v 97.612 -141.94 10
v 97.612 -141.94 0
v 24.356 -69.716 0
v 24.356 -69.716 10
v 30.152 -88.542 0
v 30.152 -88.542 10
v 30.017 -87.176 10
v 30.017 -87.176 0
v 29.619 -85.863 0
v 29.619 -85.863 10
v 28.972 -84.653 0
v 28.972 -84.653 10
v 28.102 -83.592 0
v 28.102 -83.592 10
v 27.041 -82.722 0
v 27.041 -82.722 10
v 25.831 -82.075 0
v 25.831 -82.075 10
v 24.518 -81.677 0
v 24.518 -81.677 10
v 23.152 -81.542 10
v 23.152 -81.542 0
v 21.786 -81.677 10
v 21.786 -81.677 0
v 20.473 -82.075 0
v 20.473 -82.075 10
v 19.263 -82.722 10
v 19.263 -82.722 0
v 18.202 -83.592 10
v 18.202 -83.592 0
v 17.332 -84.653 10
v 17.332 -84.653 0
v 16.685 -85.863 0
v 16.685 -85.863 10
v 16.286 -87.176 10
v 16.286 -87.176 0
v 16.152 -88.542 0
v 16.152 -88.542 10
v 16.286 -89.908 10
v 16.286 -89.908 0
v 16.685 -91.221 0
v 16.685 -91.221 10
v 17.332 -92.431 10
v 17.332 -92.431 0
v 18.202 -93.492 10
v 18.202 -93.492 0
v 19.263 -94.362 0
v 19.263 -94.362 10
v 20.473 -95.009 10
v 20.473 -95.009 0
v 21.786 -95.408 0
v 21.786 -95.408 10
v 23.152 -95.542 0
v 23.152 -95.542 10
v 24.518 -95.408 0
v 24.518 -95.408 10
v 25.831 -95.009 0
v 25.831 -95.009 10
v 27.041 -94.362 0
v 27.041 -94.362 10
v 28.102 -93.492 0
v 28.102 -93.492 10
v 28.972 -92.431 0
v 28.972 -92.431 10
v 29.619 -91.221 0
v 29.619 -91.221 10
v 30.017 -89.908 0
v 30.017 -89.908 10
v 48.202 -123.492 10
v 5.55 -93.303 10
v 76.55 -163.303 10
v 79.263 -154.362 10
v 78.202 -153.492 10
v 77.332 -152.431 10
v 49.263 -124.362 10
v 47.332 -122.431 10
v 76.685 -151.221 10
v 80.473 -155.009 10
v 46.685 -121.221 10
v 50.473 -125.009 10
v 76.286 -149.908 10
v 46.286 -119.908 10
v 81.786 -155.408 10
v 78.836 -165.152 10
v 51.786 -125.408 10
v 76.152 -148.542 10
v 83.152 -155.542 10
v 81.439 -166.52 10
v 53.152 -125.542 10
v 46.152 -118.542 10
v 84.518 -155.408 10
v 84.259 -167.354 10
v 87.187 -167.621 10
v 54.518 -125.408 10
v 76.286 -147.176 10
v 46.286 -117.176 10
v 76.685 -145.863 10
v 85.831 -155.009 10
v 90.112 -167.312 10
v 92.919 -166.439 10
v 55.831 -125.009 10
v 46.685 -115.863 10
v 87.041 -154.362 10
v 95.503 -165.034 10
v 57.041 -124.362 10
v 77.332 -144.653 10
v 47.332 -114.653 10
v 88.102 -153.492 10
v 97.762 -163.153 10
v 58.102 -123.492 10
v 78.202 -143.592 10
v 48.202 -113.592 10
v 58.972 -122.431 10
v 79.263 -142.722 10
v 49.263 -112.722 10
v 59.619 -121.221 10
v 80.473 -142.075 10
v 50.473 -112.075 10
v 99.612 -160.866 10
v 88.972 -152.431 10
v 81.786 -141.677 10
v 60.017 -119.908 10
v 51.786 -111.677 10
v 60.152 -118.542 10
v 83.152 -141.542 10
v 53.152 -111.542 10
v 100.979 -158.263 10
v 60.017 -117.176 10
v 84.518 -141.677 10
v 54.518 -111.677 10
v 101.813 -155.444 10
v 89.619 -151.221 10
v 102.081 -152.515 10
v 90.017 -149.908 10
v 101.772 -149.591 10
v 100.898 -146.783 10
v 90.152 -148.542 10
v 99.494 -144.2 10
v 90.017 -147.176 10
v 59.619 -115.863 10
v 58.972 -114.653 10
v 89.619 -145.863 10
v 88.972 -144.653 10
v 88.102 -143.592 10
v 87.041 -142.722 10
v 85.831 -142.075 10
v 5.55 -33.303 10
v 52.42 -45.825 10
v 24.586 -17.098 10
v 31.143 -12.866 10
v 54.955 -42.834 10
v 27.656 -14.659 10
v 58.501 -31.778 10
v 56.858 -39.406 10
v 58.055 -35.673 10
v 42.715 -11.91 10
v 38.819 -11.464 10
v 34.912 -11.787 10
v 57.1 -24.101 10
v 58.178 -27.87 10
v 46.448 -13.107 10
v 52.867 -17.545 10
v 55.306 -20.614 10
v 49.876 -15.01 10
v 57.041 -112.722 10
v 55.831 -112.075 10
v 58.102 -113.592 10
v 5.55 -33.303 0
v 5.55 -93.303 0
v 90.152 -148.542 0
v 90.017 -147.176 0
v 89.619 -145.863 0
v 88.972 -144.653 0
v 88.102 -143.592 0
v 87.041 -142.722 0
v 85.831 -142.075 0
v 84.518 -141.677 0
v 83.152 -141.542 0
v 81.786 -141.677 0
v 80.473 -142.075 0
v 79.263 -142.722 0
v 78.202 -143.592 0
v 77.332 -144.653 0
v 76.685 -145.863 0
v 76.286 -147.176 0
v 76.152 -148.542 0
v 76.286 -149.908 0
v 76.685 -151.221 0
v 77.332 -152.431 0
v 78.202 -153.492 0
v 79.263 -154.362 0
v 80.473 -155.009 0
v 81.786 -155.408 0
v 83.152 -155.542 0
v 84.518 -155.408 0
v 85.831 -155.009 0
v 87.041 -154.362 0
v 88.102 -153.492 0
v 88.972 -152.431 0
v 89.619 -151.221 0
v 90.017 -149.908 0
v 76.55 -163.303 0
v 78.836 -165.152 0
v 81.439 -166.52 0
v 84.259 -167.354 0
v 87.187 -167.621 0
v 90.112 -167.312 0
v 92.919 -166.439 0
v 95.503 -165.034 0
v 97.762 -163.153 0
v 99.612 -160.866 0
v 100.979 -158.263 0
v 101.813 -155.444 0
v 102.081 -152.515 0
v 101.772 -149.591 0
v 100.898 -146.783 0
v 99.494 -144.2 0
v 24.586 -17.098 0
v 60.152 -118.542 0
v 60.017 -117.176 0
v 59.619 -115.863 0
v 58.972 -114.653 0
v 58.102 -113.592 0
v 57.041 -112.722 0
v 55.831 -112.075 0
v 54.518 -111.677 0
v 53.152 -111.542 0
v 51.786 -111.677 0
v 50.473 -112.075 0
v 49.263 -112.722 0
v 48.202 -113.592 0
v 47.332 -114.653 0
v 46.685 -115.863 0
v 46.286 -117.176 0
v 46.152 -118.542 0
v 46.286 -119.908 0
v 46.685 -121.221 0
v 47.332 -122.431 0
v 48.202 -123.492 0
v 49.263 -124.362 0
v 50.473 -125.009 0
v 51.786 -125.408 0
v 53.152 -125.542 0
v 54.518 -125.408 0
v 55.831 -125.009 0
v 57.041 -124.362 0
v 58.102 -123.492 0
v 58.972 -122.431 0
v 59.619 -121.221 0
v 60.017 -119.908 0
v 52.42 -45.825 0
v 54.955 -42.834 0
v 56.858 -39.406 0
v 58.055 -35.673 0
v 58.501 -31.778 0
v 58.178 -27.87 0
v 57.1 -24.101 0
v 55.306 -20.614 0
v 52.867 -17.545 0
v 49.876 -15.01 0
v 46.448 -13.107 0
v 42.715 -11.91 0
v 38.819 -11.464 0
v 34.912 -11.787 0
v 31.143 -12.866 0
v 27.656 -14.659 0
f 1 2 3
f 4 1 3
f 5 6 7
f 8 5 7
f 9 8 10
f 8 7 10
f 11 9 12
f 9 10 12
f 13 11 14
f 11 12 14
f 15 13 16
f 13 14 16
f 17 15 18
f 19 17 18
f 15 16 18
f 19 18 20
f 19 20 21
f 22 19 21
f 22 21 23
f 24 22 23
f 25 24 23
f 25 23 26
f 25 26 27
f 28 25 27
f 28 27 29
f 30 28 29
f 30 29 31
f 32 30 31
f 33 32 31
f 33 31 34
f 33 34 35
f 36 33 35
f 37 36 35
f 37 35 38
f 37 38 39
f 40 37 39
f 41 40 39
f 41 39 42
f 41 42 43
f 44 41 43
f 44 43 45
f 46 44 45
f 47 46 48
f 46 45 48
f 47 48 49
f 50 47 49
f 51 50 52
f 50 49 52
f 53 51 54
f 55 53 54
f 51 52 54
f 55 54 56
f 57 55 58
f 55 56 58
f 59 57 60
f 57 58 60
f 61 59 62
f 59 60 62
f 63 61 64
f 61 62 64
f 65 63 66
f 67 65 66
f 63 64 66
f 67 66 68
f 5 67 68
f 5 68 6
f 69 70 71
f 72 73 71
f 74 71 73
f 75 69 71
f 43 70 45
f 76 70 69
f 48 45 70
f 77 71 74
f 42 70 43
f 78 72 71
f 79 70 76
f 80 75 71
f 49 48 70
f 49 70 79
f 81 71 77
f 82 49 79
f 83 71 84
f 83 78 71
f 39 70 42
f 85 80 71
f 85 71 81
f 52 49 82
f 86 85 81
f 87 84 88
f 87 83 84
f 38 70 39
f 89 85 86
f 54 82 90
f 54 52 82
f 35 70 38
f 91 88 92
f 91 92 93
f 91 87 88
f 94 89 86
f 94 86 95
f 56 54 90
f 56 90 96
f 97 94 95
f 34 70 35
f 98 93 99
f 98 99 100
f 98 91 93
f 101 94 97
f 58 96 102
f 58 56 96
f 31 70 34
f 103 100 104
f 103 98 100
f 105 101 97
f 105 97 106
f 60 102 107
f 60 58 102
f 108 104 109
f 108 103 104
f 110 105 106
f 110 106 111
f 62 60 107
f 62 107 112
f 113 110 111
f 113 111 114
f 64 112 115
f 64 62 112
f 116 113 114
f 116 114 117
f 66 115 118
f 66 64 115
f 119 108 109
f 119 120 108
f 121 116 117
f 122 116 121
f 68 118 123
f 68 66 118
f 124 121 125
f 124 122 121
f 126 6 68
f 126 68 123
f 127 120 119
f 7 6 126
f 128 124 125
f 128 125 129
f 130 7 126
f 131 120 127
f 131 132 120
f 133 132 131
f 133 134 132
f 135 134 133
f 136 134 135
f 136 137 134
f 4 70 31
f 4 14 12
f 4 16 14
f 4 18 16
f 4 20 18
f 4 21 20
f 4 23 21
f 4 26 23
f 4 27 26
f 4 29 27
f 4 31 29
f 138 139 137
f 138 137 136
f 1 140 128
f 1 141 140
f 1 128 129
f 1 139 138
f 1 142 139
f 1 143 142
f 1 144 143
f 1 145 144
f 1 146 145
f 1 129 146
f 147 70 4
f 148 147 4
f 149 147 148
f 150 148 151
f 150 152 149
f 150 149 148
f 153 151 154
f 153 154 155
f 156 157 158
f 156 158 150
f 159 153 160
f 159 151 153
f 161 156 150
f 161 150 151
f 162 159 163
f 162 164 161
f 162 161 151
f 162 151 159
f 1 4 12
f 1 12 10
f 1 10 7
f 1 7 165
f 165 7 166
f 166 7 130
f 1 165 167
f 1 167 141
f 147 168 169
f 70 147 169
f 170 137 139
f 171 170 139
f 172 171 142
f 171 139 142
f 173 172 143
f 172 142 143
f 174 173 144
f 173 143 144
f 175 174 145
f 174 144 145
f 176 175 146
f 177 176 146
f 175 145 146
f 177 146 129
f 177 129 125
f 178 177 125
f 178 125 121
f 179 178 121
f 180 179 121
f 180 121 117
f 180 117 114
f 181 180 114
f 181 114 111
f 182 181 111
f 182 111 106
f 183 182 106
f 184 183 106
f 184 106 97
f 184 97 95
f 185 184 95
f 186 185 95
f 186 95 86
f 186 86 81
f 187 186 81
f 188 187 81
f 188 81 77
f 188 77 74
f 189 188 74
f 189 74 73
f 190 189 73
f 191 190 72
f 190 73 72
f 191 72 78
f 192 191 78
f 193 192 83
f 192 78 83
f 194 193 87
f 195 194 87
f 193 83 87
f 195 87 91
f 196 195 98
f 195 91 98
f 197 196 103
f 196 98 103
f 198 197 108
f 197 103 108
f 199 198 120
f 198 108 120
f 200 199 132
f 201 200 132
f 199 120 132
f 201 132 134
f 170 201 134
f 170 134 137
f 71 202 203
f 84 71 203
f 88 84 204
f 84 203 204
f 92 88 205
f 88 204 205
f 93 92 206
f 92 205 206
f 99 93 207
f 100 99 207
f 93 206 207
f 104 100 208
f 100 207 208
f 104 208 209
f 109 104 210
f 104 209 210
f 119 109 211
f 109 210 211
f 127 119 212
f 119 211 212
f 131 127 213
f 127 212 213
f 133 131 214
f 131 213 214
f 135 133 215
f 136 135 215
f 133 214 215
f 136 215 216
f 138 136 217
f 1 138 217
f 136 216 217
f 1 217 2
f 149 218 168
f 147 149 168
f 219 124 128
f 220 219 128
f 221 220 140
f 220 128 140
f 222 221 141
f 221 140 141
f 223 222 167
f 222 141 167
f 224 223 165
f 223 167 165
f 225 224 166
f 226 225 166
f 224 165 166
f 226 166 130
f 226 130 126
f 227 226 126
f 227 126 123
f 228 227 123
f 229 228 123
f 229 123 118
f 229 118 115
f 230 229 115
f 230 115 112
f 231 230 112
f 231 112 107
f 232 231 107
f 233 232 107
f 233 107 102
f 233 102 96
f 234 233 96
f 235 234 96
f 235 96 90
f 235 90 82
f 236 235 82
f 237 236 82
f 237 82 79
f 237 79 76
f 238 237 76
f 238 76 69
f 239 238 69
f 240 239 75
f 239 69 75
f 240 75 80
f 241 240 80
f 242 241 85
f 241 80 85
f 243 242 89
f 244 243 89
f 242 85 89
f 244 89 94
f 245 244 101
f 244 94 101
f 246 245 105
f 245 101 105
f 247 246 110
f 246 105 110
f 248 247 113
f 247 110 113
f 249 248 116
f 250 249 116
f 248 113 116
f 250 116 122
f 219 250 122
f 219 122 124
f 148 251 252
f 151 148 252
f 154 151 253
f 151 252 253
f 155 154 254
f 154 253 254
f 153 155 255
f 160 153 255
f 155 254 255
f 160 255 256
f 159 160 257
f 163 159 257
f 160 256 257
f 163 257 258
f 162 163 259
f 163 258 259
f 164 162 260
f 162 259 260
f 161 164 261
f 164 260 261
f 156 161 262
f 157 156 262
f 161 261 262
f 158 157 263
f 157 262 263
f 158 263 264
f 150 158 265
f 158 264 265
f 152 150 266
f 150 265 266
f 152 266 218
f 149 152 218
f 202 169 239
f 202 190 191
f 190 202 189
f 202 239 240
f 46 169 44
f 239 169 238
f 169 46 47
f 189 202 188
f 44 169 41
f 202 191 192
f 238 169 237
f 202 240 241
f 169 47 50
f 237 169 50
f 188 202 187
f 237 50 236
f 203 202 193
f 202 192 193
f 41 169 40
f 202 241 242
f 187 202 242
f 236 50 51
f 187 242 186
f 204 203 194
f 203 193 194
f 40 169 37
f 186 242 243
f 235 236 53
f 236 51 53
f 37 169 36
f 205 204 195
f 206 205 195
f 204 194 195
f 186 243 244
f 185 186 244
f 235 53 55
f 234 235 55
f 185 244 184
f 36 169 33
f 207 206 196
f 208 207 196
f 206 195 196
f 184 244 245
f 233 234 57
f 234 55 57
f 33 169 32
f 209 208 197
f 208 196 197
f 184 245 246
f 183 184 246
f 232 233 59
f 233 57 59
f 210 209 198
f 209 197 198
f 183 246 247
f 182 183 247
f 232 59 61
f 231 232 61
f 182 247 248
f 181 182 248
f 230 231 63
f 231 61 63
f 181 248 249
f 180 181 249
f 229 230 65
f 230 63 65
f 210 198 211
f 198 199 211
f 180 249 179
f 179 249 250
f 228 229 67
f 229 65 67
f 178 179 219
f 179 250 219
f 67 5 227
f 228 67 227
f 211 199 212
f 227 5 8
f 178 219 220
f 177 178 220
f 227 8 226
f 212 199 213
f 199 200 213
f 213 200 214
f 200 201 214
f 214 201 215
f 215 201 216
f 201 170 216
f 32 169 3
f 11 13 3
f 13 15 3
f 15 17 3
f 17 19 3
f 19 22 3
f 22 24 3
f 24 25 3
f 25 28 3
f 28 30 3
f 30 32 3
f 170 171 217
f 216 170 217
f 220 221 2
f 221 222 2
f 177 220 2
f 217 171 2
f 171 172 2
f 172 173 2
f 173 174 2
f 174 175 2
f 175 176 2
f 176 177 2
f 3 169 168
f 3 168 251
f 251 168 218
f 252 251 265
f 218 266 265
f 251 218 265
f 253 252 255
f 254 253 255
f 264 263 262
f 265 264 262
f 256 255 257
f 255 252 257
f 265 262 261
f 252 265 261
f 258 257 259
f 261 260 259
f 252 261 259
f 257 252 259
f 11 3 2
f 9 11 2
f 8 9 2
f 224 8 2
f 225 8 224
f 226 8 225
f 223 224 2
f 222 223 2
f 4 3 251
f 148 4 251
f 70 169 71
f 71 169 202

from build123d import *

# Parameters (mm, degrees)
BOSS_EXTRUDE1_DEPTH = 10
SKETCH2_R           = 7
CUT_EXTRUDE1_DEPTH  = 197.513344998


with BuildPart() as part:
    # Sketch1 → Boss-Extrude1 (new body)
    with BuildSketch(Plane.XY):
        with BuildLine():
            Line((5.549773739, -33.303117211), (5.549773739, -93.303117211))
            Line((5.549773739, -93.303117211), (76.549773739, -163.303117211))
            ThreePointArc((76.549773739, -163.303117211), (97.76244369, -163.152672743), (97.611999223, -141.940002792))
            Line((97.611999223, -141.940002792), (24.355880913, -69.715660797))
            Line((24.355880913, -69.715660797), (52.420485151, -45.825449879))
            ThreePointArc((52.420485151, -45.825449879), (52.86718031, -17.544706193), (24.586436624, -17.098011034))
            Line((24.586436624, -17.098011034), (5.549773739, -33.303117211))
        make_face()
    extrude(amount=BOSS_EXTRUDE1_DEPTH)

    # Sketch2 → Cut-Extrude1 (cut, through all)
    with BuildSketch(Plane.XY.offset(10)):
        with Locations((23.151883869, -88.542112922)):
            Circle(SKETCH2_R)
        with Locations((53.151883869, -118.542112922)):
            Circle(SKETCH2_R)
        with Locations((83.151883869, -148.542112922)):
            Circle(SKETCH2_R)
    extrude(amount=-CUT_EXTRUDE1_DEPTH, mode=Mode.SUBTRACT)


solid = part.part
